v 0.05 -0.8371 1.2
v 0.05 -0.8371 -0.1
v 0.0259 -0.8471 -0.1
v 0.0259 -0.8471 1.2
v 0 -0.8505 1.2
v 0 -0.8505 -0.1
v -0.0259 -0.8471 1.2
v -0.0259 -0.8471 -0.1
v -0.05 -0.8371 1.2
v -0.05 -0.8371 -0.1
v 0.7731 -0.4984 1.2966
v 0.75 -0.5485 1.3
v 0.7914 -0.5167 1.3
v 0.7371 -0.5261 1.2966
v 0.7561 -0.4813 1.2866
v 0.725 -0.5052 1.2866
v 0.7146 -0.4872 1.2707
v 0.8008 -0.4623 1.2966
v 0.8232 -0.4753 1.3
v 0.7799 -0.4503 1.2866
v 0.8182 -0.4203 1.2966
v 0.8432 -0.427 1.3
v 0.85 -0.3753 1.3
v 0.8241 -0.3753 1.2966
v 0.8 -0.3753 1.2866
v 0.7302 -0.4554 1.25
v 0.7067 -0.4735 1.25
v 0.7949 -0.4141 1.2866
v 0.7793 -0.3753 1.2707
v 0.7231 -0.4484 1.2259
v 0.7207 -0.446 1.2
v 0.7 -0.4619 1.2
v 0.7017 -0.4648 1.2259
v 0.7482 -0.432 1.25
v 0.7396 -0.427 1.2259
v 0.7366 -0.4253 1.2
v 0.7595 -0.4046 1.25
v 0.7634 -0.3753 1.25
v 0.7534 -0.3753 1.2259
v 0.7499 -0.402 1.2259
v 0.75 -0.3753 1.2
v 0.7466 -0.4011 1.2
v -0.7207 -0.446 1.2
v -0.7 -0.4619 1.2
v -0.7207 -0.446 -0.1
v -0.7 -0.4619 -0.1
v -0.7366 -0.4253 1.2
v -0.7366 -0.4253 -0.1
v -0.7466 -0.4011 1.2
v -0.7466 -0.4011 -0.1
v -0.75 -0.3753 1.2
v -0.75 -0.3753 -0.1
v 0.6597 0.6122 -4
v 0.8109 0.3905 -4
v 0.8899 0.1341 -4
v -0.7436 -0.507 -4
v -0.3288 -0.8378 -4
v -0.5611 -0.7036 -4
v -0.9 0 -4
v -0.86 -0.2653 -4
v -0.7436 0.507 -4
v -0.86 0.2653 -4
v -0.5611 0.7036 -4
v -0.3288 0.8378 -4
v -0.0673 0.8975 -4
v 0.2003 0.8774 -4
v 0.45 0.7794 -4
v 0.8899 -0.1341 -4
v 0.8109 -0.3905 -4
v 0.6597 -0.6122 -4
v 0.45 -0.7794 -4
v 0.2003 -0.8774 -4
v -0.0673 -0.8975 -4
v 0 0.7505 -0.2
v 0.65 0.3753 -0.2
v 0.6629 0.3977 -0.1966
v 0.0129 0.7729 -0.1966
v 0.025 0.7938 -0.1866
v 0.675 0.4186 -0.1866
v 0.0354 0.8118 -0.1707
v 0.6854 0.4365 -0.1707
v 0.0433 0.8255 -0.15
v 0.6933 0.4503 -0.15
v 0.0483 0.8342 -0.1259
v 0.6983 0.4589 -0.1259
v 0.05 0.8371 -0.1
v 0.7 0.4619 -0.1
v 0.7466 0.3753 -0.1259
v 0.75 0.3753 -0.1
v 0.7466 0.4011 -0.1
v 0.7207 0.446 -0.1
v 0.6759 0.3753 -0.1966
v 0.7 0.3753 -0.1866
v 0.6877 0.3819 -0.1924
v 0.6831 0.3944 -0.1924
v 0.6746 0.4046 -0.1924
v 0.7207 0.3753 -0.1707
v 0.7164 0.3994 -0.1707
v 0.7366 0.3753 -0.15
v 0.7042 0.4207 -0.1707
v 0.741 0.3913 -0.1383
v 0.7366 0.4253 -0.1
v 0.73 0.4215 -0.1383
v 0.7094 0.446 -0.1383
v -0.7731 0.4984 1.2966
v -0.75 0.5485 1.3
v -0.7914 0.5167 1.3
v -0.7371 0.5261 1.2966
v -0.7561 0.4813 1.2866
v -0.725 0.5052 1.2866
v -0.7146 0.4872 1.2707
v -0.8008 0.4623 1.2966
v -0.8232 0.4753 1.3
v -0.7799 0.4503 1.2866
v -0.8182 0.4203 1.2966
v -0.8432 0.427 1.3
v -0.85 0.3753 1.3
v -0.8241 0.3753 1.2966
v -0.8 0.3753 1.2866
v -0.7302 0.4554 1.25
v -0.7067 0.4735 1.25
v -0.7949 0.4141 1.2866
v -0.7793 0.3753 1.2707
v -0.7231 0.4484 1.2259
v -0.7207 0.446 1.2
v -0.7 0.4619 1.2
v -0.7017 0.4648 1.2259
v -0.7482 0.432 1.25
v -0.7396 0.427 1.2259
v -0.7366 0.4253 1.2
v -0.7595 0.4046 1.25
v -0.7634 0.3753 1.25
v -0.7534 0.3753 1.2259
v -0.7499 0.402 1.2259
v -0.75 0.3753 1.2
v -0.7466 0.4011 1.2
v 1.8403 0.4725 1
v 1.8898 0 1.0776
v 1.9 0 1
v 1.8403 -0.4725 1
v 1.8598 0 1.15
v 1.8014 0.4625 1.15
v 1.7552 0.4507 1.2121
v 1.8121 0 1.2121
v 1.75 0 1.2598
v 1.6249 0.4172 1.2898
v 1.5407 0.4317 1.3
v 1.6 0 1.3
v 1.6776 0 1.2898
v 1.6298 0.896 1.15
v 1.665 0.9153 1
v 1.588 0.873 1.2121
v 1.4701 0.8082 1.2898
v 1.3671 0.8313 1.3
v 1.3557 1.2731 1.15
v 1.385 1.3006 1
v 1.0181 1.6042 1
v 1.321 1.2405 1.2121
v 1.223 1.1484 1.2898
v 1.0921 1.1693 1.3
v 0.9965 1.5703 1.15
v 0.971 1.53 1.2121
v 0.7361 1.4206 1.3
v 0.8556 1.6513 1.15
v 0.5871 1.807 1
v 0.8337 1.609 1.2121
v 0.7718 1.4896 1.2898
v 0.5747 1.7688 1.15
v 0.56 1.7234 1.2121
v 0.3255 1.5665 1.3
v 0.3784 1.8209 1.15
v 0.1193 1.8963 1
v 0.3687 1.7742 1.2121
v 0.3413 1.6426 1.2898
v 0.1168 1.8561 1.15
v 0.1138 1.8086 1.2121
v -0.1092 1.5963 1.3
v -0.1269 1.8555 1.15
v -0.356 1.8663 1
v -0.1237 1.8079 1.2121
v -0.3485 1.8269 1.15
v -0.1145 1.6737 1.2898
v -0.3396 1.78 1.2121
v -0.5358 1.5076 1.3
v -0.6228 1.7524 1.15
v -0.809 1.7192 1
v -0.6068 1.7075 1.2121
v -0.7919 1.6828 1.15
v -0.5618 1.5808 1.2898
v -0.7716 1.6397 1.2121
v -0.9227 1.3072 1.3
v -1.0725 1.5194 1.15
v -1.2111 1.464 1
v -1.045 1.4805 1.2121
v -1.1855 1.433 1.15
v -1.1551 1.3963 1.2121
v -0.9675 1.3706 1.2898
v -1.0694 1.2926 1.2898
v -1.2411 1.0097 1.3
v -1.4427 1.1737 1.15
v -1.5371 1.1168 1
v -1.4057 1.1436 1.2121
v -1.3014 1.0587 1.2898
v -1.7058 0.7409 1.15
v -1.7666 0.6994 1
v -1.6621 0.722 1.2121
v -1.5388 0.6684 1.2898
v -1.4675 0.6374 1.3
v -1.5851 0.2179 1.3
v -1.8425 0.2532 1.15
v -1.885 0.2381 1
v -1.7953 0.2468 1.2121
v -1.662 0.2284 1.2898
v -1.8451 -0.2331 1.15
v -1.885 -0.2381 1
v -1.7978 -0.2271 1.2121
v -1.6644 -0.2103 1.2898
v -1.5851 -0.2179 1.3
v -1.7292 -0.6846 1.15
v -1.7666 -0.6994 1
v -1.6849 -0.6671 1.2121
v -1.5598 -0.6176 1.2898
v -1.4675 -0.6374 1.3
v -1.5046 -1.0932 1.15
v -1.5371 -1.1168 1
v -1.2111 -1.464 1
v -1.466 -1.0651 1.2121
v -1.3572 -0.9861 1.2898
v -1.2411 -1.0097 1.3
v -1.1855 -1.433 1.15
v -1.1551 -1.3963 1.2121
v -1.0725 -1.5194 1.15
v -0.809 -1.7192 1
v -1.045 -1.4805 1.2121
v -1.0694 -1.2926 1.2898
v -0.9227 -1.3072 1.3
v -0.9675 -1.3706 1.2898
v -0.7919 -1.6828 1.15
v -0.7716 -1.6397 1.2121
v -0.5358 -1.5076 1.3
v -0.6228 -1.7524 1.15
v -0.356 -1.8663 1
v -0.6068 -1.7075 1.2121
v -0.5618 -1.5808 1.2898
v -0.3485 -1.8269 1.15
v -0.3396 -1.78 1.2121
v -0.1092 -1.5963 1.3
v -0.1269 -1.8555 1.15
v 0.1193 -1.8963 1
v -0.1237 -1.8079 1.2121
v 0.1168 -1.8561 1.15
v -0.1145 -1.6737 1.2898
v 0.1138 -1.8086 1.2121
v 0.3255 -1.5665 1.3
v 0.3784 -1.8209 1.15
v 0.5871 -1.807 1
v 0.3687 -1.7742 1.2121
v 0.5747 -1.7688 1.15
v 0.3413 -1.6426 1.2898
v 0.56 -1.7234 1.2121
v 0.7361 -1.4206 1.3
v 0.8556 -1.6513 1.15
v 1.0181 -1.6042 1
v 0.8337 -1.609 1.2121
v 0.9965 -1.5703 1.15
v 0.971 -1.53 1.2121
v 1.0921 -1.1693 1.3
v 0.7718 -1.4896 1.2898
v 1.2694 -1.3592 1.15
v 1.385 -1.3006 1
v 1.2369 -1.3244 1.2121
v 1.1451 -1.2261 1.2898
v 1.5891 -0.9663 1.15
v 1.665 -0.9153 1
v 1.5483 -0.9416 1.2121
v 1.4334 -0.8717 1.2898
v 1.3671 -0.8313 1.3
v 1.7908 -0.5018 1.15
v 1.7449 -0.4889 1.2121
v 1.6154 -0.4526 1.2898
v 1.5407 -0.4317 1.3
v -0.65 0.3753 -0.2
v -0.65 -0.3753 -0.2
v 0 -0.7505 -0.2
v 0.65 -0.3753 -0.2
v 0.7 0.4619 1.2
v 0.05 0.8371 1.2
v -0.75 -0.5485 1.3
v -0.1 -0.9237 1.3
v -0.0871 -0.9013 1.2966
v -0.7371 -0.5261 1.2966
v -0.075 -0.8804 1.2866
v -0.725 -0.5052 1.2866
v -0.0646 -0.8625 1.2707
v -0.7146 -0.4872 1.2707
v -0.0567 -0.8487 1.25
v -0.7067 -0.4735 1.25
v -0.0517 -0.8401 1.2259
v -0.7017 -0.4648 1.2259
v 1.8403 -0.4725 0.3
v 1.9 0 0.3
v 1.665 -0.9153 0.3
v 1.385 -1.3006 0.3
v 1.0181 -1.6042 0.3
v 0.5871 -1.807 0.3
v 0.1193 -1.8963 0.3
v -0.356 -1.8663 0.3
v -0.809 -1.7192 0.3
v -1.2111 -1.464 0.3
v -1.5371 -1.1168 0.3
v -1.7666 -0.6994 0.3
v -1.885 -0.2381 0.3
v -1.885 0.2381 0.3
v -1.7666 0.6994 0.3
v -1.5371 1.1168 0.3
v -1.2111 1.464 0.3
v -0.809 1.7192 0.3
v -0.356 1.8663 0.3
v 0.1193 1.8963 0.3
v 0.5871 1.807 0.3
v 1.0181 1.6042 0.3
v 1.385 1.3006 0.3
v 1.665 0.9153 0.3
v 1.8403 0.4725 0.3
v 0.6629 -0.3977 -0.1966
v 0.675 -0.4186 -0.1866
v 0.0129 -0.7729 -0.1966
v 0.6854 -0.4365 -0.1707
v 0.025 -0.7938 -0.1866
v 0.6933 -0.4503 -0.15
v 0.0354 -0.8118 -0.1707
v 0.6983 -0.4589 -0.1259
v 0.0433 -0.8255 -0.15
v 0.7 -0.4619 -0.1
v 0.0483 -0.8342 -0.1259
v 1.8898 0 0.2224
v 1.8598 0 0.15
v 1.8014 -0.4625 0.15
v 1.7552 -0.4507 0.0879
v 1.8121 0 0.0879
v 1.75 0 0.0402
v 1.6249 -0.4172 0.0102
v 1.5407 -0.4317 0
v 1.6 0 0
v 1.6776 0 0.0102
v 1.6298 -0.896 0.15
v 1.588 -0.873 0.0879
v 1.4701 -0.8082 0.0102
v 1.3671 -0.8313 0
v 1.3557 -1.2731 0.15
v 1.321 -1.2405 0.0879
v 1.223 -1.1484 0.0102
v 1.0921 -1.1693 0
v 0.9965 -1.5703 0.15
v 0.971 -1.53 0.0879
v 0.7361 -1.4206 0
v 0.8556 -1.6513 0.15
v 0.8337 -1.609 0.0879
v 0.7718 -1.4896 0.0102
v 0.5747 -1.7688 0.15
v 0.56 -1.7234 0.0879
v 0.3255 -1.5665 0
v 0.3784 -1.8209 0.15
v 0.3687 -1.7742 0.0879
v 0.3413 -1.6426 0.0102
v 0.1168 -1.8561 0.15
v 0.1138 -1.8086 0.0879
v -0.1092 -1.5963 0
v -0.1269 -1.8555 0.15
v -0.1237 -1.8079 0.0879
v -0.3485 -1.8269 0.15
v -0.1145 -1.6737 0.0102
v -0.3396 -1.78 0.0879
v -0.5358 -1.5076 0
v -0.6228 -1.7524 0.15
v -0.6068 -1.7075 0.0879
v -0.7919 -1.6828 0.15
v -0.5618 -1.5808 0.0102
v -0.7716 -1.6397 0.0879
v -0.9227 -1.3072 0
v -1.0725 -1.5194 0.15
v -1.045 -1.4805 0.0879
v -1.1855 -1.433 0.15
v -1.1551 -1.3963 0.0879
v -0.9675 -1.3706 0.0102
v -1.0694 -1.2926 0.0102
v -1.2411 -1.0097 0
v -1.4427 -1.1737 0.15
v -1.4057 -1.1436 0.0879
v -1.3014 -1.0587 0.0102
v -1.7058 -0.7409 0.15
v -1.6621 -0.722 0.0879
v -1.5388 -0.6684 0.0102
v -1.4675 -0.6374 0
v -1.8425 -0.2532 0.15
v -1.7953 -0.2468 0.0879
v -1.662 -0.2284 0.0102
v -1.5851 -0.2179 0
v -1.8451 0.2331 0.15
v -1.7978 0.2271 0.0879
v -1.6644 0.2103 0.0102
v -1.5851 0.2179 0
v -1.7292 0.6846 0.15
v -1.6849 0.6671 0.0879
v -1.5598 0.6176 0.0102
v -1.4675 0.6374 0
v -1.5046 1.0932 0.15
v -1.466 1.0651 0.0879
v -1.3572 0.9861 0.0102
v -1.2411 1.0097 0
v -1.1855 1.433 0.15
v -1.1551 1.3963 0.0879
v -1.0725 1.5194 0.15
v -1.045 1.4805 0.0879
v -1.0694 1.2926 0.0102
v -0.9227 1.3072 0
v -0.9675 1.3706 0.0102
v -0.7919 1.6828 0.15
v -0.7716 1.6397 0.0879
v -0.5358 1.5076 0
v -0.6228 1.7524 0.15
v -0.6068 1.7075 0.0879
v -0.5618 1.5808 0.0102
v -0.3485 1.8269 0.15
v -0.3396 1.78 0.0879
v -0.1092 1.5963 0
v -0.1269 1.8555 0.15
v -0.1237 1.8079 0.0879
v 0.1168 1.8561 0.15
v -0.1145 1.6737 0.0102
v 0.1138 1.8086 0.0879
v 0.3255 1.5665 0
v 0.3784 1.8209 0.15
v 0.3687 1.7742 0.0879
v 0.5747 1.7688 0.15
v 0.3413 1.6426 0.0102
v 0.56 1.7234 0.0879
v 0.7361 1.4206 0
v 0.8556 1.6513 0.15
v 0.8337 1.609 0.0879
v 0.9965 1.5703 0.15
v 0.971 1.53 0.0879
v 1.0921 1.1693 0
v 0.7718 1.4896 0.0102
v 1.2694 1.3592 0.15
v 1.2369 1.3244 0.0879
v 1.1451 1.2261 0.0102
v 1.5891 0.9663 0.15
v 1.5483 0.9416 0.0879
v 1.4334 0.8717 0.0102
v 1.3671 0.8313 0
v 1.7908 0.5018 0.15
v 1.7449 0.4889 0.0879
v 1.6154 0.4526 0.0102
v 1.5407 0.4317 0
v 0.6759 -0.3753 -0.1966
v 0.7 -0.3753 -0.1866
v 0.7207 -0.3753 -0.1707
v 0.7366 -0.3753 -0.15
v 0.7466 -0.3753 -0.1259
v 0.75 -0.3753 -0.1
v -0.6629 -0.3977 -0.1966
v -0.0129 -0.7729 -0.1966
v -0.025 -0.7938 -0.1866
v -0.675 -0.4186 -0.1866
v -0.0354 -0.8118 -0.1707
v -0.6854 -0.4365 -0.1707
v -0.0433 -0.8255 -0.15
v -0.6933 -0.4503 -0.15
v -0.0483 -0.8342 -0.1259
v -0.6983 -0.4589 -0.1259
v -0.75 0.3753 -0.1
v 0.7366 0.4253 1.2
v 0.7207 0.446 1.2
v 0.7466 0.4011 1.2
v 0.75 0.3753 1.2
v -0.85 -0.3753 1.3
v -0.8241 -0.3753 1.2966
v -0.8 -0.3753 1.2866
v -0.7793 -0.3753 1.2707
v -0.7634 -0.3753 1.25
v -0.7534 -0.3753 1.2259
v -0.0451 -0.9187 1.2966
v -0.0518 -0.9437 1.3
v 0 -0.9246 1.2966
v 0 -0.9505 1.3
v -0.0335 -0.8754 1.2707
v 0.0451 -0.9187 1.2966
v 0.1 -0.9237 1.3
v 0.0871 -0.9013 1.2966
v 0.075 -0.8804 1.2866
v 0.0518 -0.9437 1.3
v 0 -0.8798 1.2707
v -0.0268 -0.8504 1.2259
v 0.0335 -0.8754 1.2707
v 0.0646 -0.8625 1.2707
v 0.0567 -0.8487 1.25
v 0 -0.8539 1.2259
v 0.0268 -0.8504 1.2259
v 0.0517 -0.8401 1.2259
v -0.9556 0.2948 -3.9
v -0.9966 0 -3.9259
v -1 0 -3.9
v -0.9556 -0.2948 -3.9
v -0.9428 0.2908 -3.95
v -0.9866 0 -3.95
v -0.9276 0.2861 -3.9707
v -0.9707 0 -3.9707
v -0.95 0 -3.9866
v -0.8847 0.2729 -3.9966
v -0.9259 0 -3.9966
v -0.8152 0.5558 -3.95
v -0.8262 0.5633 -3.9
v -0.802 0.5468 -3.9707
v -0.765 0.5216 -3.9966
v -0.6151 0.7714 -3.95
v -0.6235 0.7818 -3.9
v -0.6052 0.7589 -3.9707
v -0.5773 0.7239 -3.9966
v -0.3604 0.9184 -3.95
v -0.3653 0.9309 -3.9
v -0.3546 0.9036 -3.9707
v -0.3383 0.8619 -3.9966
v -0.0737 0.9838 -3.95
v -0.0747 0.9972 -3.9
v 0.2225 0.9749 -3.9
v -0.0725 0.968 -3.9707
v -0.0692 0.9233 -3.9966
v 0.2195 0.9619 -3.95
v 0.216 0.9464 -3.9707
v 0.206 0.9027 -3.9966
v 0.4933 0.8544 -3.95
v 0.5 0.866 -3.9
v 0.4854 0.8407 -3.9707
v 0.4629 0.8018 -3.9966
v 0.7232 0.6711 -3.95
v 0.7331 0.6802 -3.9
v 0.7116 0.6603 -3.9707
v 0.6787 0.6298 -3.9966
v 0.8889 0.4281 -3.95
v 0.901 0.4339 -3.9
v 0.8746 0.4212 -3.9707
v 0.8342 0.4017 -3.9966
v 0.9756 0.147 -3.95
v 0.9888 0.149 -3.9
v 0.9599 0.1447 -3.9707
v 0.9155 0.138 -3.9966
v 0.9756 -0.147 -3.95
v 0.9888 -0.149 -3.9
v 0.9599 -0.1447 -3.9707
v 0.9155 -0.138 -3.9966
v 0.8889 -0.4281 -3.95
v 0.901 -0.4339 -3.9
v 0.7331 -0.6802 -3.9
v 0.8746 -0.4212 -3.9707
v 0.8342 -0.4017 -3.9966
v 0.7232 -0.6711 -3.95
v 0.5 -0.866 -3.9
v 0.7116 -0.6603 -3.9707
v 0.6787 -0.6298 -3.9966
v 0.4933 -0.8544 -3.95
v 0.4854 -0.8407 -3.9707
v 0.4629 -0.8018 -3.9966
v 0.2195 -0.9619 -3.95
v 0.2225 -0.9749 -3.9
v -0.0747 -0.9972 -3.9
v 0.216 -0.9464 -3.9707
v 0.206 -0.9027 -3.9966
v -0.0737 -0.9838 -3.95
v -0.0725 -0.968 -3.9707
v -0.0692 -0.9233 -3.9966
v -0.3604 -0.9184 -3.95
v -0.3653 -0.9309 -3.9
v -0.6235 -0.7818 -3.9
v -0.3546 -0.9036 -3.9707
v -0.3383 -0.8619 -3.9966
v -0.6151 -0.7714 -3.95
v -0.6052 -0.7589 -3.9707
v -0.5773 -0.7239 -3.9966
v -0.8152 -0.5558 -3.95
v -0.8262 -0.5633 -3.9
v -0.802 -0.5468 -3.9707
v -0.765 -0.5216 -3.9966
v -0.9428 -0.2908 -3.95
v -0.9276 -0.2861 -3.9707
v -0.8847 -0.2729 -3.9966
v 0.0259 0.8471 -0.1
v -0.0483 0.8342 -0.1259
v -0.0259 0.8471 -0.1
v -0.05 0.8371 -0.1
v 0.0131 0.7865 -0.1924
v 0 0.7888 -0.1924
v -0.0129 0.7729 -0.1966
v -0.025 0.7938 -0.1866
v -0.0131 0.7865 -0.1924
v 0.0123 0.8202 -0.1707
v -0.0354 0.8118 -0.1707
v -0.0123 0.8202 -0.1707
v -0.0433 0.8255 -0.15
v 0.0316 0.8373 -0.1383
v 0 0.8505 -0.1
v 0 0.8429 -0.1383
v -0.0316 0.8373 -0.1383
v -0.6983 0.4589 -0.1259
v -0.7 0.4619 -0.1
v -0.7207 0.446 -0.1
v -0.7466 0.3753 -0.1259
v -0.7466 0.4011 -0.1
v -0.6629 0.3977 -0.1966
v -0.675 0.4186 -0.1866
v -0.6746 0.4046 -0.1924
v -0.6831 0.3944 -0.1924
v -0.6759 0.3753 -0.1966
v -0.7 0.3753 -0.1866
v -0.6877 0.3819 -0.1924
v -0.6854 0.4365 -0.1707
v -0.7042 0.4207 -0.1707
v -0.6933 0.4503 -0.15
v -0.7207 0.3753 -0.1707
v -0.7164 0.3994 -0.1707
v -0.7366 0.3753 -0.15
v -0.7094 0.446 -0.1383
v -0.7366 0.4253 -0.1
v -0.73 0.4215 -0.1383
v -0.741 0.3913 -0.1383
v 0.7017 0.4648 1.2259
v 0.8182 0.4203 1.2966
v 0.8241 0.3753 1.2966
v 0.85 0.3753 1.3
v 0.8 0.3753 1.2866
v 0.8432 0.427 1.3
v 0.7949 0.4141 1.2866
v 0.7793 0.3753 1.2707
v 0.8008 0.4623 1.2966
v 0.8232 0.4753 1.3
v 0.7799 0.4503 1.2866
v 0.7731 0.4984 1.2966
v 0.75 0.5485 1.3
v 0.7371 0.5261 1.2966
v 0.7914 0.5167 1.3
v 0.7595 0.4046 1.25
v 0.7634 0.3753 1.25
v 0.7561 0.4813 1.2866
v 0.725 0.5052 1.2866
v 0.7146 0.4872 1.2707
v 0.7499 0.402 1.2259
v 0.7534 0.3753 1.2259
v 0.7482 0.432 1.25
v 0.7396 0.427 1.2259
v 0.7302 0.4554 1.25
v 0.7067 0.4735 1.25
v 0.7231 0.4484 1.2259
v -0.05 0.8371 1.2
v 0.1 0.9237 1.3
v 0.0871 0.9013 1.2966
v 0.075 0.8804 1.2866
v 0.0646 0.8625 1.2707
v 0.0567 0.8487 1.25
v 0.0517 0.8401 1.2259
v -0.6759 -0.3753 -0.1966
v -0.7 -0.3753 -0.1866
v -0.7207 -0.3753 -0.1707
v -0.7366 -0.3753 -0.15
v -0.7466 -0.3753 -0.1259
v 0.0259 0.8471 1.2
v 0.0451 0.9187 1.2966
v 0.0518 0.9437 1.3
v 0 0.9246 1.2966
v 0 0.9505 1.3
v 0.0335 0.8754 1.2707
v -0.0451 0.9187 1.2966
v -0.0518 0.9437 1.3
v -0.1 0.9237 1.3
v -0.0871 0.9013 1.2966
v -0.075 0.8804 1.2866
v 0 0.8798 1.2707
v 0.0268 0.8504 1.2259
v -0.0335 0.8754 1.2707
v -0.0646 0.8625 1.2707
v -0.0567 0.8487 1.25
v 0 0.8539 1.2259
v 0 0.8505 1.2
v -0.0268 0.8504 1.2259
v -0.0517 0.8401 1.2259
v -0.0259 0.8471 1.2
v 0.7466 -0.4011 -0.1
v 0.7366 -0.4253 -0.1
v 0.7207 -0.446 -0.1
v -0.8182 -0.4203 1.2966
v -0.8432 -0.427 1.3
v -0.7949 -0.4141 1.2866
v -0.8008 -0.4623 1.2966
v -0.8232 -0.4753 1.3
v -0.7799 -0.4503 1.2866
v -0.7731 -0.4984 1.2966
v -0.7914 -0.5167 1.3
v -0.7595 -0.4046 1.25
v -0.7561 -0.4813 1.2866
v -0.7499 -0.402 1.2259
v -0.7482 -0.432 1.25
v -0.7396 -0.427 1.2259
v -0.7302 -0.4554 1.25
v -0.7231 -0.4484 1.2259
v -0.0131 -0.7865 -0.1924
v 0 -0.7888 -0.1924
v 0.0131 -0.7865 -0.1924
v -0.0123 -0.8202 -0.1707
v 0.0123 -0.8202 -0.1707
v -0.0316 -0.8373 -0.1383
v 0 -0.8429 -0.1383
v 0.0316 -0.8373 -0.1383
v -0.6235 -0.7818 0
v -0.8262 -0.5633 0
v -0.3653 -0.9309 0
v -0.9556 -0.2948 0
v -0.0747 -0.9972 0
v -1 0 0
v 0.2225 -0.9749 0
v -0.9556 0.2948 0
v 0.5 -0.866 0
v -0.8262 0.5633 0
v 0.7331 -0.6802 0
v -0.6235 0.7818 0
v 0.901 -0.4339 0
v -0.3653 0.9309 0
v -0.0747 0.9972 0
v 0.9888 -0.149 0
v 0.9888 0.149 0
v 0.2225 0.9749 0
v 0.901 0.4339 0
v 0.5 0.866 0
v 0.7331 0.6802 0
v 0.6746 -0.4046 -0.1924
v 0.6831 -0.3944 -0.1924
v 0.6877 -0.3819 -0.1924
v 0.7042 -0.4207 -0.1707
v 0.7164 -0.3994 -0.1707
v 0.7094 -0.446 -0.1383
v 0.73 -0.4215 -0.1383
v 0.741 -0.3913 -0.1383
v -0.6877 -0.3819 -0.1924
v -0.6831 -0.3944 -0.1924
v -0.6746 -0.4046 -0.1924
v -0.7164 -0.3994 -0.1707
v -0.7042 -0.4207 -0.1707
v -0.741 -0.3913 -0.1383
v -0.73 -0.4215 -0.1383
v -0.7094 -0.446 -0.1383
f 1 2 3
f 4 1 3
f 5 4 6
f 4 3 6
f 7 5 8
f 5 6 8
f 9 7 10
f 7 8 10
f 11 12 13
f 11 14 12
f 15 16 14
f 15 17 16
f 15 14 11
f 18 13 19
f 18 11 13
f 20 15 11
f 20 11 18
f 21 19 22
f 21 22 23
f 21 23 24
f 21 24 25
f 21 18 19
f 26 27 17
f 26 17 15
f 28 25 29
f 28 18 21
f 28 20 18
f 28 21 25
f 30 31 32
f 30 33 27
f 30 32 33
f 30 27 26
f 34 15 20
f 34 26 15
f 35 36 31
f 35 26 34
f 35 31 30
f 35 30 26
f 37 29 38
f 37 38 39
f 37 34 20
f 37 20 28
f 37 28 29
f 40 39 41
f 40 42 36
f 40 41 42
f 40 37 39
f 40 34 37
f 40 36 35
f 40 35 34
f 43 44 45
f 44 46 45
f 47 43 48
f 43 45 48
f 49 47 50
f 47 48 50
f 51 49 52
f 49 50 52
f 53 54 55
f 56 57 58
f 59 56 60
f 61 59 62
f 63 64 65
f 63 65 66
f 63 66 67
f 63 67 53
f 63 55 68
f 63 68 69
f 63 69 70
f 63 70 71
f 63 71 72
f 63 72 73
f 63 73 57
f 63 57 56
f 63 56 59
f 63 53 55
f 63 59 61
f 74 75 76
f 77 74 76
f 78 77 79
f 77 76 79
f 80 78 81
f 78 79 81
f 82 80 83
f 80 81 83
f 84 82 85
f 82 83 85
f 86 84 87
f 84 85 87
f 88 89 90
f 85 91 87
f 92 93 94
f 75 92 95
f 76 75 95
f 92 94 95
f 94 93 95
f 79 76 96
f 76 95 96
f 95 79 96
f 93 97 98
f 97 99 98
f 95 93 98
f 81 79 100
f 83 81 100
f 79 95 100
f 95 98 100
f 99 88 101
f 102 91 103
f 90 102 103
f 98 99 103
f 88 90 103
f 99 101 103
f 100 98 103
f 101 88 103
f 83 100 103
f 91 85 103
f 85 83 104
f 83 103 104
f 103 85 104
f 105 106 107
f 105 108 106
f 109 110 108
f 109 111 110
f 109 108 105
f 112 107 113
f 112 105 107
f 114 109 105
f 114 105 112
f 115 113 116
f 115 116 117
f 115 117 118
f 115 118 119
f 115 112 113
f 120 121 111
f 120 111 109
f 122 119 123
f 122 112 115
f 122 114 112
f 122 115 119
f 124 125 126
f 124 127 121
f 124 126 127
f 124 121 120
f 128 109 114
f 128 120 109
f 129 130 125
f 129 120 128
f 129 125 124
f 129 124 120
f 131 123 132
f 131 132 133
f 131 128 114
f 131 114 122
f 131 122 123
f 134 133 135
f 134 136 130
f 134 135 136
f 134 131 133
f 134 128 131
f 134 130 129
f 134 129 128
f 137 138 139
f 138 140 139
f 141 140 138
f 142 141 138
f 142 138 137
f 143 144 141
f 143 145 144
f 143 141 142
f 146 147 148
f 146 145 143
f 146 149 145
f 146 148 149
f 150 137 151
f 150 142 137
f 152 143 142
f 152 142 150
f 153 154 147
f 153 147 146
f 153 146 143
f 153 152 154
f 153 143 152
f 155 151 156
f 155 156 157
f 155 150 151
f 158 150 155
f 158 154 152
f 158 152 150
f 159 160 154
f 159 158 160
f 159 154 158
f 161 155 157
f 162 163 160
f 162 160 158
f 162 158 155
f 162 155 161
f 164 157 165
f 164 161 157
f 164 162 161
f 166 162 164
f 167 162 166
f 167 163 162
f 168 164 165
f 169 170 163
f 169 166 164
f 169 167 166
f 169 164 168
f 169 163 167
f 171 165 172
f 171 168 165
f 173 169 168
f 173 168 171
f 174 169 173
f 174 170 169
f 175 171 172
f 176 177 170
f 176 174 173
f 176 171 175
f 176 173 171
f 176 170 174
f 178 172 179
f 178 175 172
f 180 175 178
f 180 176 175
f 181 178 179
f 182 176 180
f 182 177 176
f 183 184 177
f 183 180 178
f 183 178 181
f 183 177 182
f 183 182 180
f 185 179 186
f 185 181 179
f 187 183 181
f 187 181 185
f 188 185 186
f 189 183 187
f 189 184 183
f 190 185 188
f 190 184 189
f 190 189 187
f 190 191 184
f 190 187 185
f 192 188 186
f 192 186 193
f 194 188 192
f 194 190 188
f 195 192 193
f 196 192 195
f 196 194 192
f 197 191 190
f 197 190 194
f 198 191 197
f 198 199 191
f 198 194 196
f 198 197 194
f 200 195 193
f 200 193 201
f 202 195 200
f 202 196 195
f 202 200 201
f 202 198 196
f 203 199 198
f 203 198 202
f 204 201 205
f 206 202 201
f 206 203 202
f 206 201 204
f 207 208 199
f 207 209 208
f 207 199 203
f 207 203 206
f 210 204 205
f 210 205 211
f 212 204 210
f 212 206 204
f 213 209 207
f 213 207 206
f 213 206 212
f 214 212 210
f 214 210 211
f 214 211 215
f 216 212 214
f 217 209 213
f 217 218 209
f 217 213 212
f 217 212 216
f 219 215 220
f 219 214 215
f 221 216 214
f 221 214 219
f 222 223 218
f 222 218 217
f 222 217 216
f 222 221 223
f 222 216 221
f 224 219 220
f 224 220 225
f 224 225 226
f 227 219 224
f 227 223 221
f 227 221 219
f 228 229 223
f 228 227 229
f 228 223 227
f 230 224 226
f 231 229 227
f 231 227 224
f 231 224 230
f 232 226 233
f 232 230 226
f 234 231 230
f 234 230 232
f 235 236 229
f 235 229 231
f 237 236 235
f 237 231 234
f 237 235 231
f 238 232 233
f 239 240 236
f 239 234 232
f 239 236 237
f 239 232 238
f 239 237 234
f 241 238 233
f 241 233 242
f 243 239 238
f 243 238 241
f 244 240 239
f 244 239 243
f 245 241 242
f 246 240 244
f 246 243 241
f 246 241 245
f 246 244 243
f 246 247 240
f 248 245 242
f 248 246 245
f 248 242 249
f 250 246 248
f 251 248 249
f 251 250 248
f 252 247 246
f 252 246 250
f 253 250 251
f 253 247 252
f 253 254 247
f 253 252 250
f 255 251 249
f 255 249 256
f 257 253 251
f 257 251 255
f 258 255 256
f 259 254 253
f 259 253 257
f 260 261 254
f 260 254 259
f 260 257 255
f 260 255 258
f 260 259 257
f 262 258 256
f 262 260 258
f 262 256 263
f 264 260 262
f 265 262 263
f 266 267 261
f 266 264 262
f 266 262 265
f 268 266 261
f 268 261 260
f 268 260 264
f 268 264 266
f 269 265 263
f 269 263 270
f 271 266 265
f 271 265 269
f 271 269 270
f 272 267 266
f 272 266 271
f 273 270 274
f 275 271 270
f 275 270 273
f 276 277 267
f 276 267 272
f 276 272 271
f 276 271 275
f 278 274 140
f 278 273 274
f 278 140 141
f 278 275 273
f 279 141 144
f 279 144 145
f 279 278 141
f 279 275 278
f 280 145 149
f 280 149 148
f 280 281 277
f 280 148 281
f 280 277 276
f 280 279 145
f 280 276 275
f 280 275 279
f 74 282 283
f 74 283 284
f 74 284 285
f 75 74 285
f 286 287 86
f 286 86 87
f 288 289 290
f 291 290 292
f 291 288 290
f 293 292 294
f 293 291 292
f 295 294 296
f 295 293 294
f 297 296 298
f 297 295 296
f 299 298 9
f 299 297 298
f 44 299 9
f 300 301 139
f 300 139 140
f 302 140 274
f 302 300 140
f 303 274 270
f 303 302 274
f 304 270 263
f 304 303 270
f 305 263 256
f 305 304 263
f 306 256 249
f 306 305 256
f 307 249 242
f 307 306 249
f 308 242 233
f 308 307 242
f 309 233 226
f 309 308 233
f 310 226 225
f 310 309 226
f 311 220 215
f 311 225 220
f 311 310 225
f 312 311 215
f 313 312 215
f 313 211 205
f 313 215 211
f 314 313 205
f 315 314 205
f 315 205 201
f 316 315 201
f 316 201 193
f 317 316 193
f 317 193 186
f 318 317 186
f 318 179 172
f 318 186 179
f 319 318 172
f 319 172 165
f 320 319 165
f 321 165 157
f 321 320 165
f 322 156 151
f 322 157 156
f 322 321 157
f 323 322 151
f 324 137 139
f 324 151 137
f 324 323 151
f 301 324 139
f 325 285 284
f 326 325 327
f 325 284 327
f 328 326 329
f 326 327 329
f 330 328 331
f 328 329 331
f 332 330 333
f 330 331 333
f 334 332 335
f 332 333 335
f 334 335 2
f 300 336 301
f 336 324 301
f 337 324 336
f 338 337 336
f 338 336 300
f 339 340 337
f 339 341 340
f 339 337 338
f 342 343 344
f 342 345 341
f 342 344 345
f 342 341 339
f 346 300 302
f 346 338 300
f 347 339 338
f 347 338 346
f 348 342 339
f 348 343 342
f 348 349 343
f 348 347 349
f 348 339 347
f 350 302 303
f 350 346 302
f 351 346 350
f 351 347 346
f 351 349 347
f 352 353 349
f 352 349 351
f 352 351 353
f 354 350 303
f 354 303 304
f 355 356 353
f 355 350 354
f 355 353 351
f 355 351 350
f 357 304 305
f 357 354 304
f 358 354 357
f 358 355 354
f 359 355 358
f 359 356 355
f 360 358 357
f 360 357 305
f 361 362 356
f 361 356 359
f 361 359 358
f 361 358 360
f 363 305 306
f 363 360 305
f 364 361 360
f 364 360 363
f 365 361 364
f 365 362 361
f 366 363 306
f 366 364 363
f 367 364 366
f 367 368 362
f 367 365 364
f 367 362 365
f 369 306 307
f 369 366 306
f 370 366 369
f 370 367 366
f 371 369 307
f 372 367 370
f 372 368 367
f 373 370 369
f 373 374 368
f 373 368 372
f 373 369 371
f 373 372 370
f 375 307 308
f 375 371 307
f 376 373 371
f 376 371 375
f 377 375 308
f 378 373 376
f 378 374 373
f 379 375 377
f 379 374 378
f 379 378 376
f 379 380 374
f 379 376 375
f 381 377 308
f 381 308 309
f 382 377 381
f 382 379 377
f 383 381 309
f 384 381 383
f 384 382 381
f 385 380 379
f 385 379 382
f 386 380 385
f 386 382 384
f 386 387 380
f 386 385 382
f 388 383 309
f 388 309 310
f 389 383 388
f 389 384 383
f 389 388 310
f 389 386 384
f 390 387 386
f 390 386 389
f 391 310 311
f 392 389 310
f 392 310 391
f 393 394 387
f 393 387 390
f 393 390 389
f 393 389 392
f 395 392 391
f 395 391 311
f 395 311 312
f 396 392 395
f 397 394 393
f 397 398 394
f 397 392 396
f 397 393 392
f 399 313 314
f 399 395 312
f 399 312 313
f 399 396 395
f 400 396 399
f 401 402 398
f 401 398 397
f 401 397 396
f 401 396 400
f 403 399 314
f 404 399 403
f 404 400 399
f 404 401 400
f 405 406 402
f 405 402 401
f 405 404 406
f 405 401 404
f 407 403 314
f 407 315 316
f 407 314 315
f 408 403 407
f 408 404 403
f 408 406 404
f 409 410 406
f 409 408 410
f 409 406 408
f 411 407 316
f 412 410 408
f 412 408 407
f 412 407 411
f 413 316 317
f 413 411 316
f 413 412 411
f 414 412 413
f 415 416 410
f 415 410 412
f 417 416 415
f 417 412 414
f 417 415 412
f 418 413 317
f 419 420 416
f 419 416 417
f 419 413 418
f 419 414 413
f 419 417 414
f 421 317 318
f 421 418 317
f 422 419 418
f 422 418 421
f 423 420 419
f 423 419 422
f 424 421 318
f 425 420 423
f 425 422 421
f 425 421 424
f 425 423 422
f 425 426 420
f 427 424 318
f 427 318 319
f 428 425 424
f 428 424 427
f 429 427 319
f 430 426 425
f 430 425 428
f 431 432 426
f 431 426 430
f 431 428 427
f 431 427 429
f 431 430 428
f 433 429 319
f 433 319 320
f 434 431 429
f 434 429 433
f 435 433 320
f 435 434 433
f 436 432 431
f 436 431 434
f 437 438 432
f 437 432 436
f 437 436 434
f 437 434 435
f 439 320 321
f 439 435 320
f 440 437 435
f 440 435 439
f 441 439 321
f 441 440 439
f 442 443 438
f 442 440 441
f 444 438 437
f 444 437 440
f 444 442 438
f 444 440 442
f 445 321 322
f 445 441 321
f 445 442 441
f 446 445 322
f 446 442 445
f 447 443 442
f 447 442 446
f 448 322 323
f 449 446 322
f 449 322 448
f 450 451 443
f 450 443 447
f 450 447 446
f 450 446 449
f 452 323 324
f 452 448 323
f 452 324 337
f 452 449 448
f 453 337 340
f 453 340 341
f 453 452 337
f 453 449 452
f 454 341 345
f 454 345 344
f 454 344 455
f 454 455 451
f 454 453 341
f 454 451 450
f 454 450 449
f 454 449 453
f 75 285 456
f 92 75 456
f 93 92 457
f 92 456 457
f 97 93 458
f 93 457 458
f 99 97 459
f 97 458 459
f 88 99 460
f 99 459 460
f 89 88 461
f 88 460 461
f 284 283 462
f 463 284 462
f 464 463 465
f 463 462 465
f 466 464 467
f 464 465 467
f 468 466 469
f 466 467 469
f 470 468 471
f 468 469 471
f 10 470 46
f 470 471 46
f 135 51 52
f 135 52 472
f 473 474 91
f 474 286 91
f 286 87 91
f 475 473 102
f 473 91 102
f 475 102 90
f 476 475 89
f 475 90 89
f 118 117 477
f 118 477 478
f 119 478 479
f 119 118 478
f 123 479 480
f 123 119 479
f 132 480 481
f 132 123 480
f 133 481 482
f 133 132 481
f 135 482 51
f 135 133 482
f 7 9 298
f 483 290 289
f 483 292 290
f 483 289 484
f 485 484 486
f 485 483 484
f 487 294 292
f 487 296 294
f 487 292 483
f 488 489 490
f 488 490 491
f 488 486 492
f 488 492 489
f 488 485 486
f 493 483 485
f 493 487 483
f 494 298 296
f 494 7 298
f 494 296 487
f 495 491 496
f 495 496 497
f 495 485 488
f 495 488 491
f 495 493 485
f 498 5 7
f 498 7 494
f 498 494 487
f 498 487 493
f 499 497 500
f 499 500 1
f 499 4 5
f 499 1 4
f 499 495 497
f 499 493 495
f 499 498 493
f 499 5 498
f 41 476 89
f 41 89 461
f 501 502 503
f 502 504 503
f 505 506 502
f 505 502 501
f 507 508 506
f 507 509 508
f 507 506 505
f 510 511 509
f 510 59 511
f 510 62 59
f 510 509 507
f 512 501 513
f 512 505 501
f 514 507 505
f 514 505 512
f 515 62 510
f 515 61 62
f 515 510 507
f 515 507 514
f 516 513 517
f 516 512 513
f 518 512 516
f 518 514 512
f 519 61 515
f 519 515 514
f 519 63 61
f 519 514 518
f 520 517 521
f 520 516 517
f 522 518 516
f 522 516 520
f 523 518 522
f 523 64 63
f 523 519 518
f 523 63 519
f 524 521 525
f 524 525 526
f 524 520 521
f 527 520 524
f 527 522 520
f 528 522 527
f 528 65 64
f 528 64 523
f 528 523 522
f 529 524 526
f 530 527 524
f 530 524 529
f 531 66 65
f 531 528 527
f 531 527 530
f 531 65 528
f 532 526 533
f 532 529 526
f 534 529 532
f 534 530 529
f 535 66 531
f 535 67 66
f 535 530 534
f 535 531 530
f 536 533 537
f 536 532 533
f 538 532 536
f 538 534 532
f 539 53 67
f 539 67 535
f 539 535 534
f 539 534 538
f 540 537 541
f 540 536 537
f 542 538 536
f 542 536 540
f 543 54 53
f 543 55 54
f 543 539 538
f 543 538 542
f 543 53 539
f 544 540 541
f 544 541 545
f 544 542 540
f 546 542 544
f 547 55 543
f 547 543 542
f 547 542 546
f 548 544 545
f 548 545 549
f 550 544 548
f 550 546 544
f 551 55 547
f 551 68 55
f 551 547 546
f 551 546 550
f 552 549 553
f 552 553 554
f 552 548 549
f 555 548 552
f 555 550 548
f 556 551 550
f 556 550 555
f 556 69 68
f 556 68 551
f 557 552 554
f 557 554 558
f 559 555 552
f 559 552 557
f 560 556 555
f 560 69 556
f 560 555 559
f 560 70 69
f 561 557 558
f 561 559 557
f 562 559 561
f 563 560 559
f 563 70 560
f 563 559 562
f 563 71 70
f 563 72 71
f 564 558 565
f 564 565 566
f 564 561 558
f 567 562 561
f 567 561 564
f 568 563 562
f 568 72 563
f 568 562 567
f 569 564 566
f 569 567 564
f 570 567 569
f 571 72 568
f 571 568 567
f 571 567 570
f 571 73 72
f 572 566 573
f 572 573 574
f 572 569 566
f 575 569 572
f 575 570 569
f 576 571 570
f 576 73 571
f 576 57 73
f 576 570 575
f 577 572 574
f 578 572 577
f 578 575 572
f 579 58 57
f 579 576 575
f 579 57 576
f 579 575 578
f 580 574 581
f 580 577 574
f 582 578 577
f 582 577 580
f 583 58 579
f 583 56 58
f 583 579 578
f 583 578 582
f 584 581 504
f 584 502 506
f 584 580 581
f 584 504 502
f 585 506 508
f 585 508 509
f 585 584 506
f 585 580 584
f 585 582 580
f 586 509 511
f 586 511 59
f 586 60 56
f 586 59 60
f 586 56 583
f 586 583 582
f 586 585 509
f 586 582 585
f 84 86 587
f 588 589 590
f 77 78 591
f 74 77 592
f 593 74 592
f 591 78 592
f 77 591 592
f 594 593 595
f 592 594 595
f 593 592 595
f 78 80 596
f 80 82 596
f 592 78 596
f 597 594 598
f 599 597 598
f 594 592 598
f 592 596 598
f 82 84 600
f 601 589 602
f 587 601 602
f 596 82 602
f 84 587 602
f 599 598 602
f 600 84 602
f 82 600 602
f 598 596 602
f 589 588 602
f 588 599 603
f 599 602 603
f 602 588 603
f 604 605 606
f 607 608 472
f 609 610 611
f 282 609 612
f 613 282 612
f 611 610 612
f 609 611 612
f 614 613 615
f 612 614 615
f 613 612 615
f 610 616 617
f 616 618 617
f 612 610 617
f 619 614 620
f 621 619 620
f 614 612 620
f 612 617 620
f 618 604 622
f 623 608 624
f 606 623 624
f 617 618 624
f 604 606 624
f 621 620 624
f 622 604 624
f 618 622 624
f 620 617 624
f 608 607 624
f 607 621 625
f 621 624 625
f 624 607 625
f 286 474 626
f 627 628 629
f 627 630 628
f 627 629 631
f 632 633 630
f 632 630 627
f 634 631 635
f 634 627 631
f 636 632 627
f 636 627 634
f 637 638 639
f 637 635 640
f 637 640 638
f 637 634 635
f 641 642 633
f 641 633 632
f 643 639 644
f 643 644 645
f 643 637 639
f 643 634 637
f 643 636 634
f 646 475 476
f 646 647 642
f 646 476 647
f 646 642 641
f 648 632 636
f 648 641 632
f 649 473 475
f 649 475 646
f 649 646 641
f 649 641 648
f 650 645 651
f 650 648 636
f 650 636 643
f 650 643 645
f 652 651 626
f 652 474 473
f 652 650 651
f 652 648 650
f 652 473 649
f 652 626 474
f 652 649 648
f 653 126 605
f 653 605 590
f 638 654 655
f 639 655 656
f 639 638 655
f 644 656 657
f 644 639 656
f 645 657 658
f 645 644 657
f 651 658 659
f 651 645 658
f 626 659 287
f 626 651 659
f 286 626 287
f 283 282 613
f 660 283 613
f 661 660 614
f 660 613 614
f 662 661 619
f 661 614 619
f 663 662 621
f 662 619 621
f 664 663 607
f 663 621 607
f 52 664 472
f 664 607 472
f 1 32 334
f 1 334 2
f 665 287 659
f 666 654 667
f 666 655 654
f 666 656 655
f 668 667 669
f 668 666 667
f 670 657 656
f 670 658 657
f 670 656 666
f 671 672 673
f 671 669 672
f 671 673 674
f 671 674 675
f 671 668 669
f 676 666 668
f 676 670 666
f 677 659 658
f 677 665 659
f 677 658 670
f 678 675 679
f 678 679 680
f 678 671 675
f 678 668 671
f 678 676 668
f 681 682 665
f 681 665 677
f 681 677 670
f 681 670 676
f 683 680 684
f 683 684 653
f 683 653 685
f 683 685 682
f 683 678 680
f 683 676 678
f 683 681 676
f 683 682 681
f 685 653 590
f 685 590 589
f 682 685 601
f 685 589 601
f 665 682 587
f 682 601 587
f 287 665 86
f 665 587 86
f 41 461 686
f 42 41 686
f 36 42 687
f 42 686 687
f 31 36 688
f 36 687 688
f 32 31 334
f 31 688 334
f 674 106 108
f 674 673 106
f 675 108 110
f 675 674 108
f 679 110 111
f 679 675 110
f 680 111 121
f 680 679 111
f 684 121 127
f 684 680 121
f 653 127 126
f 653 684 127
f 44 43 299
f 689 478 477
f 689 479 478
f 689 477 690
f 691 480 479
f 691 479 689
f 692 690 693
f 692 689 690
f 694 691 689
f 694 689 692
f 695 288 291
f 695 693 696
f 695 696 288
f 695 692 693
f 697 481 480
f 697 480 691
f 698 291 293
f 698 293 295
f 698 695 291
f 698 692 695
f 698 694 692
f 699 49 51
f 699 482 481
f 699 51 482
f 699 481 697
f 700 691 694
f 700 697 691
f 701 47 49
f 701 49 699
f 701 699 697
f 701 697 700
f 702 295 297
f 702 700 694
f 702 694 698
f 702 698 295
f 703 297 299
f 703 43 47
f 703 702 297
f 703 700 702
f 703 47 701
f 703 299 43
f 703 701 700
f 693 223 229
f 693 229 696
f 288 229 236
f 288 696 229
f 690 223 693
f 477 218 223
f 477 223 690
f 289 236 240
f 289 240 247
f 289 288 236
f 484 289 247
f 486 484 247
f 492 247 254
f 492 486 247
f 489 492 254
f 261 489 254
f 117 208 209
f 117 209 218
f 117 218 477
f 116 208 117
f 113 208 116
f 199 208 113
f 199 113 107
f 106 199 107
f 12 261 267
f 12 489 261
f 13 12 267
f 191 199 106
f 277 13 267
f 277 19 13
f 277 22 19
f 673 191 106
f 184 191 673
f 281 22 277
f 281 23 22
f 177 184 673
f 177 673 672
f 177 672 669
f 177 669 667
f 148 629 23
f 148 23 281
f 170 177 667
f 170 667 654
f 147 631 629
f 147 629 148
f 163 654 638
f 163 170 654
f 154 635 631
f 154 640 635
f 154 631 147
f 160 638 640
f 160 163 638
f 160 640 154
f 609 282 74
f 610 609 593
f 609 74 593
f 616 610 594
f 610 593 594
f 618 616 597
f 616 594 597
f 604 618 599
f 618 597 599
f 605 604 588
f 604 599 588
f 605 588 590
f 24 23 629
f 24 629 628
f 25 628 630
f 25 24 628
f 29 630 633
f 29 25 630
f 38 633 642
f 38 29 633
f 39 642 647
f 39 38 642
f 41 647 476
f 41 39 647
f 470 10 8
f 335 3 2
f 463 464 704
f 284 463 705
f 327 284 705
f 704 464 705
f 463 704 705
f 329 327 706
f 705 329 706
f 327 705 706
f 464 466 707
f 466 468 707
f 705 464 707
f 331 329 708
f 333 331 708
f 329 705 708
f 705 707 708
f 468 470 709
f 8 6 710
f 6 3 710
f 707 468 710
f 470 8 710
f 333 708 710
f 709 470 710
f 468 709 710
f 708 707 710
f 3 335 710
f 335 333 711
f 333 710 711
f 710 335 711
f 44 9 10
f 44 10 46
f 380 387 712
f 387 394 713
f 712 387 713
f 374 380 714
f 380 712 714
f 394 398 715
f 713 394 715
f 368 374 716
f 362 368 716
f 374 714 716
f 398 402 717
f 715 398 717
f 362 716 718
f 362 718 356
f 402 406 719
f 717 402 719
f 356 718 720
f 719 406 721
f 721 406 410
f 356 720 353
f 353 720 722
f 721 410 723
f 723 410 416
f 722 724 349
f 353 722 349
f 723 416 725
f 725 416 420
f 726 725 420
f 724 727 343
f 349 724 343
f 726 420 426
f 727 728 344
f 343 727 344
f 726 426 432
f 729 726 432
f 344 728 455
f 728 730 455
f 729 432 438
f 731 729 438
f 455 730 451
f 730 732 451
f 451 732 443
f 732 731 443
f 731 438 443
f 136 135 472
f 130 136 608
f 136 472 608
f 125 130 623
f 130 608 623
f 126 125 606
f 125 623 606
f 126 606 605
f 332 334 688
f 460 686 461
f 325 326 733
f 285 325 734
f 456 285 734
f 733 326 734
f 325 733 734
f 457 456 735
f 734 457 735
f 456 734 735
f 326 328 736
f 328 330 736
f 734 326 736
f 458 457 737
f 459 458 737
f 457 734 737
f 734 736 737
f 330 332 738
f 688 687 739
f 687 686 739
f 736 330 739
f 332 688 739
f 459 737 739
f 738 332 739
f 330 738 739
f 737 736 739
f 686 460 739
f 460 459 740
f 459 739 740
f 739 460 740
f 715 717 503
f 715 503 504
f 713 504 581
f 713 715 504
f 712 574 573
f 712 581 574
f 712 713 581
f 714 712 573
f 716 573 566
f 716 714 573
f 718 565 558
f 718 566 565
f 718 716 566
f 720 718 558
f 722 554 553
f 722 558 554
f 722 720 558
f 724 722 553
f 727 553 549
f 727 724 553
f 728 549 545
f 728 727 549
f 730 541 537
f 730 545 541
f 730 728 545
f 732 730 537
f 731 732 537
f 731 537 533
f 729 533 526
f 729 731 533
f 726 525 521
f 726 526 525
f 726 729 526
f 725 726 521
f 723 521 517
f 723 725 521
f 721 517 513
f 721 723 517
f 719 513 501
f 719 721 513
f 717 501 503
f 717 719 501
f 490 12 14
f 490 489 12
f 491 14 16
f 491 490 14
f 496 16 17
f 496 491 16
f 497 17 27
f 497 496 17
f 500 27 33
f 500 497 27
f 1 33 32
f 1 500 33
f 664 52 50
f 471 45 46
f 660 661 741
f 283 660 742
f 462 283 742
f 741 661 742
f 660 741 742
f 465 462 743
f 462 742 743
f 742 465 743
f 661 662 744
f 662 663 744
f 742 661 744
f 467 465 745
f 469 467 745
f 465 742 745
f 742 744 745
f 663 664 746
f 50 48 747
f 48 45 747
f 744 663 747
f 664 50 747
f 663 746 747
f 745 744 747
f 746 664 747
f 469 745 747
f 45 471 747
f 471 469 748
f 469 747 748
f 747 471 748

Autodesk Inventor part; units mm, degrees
ref_plane "YZ Plane" through (0, 0, 0) normal (1, 0, 0) x (0, 1, 0)
ref_plane "XZ Plane" through (0, 0, 0) normal (0, 1, 0) x (-1, 0, 0)
ref_plane "XY Plane" through (0, 0, 0) normal (0, 0, 1) x (1, 0, 0)
sketch "スケッチ1" plane through (0, 0, 0) normal (0, 0, 1) x (1, 0, 0)
  circle A0 centre (0, 0) radius 1.9
  dimension "d0" = 3.8
extrude "押し出し1" add sketch "スケッチ1" along normal blind 1.3
sketch "スケッチ2" plane through (0, 0, 0) normal (0, 0, -1) x (-1, 0, 0)
  circle A0 centre (0, 0) radius 1.9 projected
  circle A1 centre (0, 0) radius 1
  dimension "d3" = 2
extrude "押し出し2" add sketch "スケッチ2" along normal blind 4 contours A1
sketch "スケッチ3" plane through (0, 0, 1.3) normal (0, 0, 1) x (1, 0, 0)
  circle A0 centre (0, 0) radius 1.9 projected
  line L0 (0, 0.866) -> (0.75, 0.433)
  line L1 (0.75, 0.433) -> (0.75, -0.433)
  line L2 (0.75, -0.433) -> (0, -0.866)
  line L3 (0, -0.866) -> (-0.75, -0.433)
  line L4 (-0.75, -0.433) -> (-0.75, 0.433)
  line L5 (-0.75, 0.433) -> (0, 0.866)
  dimension "d6" = 0.75
extrude "押し出し3" cut sketch "スケッチ3" against normal blind 1.5 contours L0 L1 L2 L3 L4 L5
fillet "フィレット1" radius 0.3 2 edges at (-1.9, 0, 1.3) (-1.9, 0, 0)
fillet "フィレット2" radius 0.1 19 edges at (-0.375, 0.6495, 1.3) (-0.75, 0, 1.3) (-0.375, -0.6495, 1.3) (0.375, -0.6495, 1.3) (0.75, 0, 1.3) (0.375, 0.6495, 1.3) (-0.375, 0.6495, -0.2) (0.375, 0.6495, -0.2) (0, 0.866, 0.55) (-0.75, 0.433, 0.55) (-0.375, -0.6495, -0.2) (-0.75, -0.433, 0.55) (-0.75, 0, -0.2) (0.75, 0, -0.2) (0.75, 0.433, 0.55) (0.75, -0.433, 0.55) (0.375, -0.6495, -0.2) (0, -0.866, 0.55) (1, 0, -4)
thread "ねじ3" size "M2x0.4" class "6g" standard "ANSI Metric M Profile" full length
